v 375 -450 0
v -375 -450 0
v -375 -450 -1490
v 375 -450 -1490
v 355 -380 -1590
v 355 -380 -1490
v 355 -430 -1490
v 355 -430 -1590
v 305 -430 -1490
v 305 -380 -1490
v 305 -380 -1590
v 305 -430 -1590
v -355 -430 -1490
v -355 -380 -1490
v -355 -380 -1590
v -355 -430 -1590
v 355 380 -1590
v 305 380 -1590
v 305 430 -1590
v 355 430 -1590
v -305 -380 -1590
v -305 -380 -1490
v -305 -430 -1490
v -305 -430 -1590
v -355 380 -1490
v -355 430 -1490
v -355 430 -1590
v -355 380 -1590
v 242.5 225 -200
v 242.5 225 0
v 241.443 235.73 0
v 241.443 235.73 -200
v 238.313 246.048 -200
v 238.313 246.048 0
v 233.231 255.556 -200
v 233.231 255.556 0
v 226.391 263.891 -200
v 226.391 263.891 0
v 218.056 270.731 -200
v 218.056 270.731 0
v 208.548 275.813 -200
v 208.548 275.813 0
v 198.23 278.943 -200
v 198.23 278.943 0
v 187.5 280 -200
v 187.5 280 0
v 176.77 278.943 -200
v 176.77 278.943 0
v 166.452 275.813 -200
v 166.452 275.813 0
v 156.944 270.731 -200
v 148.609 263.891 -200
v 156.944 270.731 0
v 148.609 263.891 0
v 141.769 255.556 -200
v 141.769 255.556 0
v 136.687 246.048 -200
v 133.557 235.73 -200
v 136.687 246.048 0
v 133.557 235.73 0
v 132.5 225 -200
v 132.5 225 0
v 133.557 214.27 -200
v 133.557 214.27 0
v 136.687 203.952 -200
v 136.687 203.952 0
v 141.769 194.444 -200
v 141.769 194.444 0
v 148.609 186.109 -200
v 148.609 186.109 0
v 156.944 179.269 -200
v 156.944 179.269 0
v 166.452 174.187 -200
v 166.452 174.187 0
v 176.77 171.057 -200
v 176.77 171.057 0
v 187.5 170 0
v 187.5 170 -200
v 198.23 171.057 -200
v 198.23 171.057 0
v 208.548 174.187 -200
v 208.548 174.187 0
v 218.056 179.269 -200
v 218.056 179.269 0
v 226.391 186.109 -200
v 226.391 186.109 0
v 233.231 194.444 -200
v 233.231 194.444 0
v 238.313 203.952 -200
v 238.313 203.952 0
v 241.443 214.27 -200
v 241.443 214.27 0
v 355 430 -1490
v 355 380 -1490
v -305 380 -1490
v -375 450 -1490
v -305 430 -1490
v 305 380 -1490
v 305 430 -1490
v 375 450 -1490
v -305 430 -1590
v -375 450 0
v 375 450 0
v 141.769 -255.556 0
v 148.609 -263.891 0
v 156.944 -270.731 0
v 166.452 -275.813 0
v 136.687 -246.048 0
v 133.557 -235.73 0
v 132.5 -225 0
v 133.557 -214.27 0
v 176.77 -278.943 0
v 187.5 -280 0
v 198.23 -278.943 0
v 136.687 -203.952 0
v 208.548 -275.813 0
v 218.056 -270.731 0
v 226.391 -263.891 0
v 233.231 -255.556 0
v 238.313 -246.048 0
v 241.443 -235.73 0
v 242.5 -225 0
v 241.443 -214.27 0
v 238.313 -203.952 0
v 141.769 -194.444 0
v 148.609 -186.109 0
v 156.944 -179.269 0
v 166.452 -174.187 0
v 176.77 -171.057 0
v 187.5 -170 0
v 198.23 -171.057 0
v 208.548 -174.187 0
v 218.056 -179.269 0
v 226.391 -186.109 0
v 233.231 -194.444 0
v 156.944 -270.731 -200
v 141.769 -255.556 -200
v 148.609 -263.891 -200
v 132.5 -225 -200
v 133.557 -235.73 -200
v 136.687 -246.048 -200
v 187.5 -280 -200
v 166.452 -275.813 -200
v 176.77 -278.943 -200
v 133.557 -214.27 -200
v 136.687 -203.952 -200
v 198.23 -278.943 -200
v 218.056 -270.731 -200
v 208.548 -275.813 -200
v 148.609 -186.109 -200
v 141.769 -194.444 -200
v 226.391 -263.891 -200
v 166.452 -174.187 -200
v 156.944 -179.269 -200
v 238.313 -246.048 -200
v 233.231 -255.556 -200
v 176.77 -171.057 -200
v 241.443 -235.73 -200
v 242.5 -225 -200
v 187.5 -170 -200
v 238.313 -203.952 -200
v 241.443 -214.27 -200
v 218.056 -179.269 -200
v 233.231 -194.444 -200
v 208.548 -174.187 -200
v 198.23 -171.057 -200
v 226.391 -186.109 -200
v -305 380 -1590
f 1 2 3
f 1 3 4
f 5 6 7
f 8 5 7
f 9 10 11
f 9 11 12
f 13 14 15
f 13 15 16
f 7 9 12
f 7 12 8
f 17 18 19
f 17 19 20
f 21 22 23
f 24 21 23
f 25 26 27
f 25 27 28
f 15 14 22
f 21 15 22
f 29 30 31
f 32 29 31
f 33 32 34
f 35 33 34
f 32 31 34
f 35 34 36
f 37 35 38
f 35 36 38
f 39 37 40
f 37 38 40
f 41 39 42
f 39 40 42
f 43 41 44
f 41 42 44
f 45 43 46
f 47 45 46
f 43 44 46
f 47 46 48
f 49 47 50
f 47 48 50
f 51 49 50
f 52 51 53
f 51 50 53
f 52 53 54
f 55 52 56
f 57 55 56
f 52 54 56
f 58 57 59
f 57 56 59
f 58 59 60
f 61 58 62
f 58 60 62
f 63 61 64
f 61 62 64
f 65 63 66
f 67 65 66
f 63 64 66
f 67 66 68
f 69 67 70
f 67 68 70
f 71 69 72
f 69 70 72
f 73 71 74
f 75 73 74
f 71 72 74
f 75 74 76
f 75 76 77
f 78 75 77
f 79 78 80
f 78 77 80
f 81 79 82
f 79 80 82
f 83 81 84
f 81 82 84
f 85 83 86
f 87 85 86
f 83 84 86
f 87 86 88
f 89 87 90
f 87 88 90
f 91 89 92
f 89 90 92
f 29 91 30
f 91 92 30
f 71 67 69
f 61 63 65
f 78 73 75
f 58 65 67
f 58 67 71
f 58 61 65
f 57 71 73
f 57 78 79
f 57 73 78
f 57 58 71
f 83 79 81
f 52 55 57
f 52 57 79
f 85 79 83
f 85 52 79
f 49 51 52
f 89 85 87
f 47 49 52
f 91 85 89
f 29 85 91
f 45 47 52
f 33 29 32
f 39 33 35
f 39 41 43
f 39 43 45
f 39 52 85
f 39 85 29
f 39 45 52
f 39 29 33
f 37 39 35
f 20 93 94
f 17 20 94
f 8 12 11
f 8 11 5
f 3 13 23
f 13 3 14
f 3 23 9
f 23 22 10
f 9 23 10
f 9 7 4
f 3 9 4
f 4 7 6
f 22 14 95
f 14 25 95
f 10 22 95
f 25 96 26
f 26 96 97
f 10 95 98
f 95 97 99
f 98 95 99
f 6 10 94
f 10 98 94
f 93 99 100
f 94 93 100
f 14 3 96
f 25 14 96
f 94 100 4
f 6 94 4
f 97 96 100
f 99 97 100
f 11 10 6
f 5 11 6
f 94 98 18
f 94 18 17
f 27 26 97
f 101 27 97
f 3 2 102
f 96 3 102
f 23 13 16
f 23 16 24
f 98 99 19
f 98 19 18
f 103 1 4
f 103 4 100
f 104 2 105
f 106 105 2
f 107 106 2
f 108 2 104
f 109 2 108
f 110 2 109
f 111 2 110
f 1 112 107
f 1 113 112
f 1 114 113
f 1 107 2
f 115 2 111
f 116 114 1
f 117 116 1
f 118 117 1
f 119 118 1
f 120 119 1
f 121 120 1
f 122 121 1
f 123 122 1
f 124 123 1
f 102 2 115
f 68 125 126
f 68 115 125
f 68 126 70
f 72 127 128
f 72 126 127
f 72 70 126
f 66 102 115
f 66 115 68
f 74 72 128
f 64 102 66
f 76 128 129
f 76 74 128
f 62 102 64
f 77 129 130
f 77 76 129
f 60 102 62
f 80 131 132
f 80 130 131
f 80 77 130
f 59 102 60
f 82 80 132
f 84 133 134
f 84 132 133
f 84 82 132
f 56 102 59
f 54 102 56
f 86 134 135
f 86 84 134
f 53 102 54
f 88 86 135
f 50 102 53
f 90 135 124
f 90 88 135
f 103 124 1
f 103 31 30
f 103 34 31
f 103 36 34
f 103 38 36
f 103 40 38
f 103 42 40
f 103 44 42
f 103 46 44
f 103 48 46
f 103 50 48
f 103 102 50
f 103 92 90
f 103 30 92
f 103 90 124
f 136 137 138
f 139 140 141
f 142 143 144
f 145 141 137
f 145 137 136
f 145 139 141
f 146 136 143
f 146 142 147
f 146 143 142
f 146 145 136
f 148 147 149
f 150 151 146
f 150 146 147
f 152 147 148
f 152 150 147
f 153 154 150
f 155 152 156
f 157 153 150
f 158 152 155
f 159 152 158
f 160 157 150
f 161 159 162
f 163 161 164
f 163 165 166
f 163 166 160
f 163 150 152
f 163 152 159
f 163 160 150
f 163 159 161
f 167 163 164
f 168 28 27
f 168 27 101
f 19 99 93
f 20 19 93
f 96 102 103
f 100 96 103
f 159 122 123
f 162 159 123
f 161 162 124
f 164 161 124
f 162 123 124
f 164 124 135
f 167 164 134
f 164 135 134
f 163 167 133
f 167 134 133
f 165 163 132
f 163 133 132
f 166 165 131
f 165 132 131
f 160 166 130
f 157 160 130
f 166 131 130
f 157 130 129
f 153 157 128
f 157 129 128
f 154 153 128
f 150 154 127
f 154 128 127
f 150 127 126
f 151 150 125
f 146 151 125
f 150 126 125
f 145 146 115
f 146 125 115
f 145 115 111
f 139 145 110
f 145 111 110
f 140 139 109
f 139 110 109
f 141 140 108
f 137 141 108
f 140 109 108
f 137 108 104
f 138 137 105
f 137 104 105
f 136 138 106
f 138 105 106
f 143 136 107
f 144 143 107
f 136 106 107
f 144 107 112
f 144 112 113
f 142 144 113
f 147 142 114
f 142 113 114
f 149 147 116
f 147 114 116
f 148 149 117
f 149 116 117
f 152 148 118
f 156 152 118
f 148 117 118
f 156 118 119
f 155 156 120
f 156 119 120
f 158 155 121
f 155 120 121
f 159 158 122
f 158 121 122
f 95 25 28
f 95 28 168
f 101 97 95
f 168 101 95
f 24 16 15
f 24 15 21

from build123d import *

# Parameters (mm, degrees)
F0_W     = 750
F0_H     = 900
F1_DEPTH = 1490
F2_W     = 50
F2_H     = 50
F3_DEPTH = 100
F4_R     = 55
F5_DEPTH = 200


with BuildPart() as f1:
    # F0 (on Top) → F1 (new body)
    with BuildSketch(Plane.XY):
        Rectangle(F0_W, F0_H)
    extrude(amount=-F1_DEPTH)

    # F2 (on face) → F3 (join)
    with BuildSketch(Plane(origin=(0, 0, -1490), x_dir=(1, 0, 0), z_dir=(0, 0, -1))):
        with Locations((-330, 405)):
            Rectangle(F2_W, F2_H)
        with Locations((330, 405)):
            Rectangle(F2_W, F2_H)
        with Locations((-330, -405)):
            Rectangle(F2_W, F2_H)
        with Locations((330, -405)):
            Rectangle(F2_W, F2_H)
    extrude(amount=F3_DEPTH)

    # F4 (on face) → F5 (cut)
    with BuildSketch(Plane.XY):
        with Locations((187.5, 225)):
            Circle(F4_R)
        with Locations((187.5, -225)):
            Circle(F4_R)
    extrude(amount=-F5_DEPTH, mode=Mode.SUBTRACT)


solid = f1.part
